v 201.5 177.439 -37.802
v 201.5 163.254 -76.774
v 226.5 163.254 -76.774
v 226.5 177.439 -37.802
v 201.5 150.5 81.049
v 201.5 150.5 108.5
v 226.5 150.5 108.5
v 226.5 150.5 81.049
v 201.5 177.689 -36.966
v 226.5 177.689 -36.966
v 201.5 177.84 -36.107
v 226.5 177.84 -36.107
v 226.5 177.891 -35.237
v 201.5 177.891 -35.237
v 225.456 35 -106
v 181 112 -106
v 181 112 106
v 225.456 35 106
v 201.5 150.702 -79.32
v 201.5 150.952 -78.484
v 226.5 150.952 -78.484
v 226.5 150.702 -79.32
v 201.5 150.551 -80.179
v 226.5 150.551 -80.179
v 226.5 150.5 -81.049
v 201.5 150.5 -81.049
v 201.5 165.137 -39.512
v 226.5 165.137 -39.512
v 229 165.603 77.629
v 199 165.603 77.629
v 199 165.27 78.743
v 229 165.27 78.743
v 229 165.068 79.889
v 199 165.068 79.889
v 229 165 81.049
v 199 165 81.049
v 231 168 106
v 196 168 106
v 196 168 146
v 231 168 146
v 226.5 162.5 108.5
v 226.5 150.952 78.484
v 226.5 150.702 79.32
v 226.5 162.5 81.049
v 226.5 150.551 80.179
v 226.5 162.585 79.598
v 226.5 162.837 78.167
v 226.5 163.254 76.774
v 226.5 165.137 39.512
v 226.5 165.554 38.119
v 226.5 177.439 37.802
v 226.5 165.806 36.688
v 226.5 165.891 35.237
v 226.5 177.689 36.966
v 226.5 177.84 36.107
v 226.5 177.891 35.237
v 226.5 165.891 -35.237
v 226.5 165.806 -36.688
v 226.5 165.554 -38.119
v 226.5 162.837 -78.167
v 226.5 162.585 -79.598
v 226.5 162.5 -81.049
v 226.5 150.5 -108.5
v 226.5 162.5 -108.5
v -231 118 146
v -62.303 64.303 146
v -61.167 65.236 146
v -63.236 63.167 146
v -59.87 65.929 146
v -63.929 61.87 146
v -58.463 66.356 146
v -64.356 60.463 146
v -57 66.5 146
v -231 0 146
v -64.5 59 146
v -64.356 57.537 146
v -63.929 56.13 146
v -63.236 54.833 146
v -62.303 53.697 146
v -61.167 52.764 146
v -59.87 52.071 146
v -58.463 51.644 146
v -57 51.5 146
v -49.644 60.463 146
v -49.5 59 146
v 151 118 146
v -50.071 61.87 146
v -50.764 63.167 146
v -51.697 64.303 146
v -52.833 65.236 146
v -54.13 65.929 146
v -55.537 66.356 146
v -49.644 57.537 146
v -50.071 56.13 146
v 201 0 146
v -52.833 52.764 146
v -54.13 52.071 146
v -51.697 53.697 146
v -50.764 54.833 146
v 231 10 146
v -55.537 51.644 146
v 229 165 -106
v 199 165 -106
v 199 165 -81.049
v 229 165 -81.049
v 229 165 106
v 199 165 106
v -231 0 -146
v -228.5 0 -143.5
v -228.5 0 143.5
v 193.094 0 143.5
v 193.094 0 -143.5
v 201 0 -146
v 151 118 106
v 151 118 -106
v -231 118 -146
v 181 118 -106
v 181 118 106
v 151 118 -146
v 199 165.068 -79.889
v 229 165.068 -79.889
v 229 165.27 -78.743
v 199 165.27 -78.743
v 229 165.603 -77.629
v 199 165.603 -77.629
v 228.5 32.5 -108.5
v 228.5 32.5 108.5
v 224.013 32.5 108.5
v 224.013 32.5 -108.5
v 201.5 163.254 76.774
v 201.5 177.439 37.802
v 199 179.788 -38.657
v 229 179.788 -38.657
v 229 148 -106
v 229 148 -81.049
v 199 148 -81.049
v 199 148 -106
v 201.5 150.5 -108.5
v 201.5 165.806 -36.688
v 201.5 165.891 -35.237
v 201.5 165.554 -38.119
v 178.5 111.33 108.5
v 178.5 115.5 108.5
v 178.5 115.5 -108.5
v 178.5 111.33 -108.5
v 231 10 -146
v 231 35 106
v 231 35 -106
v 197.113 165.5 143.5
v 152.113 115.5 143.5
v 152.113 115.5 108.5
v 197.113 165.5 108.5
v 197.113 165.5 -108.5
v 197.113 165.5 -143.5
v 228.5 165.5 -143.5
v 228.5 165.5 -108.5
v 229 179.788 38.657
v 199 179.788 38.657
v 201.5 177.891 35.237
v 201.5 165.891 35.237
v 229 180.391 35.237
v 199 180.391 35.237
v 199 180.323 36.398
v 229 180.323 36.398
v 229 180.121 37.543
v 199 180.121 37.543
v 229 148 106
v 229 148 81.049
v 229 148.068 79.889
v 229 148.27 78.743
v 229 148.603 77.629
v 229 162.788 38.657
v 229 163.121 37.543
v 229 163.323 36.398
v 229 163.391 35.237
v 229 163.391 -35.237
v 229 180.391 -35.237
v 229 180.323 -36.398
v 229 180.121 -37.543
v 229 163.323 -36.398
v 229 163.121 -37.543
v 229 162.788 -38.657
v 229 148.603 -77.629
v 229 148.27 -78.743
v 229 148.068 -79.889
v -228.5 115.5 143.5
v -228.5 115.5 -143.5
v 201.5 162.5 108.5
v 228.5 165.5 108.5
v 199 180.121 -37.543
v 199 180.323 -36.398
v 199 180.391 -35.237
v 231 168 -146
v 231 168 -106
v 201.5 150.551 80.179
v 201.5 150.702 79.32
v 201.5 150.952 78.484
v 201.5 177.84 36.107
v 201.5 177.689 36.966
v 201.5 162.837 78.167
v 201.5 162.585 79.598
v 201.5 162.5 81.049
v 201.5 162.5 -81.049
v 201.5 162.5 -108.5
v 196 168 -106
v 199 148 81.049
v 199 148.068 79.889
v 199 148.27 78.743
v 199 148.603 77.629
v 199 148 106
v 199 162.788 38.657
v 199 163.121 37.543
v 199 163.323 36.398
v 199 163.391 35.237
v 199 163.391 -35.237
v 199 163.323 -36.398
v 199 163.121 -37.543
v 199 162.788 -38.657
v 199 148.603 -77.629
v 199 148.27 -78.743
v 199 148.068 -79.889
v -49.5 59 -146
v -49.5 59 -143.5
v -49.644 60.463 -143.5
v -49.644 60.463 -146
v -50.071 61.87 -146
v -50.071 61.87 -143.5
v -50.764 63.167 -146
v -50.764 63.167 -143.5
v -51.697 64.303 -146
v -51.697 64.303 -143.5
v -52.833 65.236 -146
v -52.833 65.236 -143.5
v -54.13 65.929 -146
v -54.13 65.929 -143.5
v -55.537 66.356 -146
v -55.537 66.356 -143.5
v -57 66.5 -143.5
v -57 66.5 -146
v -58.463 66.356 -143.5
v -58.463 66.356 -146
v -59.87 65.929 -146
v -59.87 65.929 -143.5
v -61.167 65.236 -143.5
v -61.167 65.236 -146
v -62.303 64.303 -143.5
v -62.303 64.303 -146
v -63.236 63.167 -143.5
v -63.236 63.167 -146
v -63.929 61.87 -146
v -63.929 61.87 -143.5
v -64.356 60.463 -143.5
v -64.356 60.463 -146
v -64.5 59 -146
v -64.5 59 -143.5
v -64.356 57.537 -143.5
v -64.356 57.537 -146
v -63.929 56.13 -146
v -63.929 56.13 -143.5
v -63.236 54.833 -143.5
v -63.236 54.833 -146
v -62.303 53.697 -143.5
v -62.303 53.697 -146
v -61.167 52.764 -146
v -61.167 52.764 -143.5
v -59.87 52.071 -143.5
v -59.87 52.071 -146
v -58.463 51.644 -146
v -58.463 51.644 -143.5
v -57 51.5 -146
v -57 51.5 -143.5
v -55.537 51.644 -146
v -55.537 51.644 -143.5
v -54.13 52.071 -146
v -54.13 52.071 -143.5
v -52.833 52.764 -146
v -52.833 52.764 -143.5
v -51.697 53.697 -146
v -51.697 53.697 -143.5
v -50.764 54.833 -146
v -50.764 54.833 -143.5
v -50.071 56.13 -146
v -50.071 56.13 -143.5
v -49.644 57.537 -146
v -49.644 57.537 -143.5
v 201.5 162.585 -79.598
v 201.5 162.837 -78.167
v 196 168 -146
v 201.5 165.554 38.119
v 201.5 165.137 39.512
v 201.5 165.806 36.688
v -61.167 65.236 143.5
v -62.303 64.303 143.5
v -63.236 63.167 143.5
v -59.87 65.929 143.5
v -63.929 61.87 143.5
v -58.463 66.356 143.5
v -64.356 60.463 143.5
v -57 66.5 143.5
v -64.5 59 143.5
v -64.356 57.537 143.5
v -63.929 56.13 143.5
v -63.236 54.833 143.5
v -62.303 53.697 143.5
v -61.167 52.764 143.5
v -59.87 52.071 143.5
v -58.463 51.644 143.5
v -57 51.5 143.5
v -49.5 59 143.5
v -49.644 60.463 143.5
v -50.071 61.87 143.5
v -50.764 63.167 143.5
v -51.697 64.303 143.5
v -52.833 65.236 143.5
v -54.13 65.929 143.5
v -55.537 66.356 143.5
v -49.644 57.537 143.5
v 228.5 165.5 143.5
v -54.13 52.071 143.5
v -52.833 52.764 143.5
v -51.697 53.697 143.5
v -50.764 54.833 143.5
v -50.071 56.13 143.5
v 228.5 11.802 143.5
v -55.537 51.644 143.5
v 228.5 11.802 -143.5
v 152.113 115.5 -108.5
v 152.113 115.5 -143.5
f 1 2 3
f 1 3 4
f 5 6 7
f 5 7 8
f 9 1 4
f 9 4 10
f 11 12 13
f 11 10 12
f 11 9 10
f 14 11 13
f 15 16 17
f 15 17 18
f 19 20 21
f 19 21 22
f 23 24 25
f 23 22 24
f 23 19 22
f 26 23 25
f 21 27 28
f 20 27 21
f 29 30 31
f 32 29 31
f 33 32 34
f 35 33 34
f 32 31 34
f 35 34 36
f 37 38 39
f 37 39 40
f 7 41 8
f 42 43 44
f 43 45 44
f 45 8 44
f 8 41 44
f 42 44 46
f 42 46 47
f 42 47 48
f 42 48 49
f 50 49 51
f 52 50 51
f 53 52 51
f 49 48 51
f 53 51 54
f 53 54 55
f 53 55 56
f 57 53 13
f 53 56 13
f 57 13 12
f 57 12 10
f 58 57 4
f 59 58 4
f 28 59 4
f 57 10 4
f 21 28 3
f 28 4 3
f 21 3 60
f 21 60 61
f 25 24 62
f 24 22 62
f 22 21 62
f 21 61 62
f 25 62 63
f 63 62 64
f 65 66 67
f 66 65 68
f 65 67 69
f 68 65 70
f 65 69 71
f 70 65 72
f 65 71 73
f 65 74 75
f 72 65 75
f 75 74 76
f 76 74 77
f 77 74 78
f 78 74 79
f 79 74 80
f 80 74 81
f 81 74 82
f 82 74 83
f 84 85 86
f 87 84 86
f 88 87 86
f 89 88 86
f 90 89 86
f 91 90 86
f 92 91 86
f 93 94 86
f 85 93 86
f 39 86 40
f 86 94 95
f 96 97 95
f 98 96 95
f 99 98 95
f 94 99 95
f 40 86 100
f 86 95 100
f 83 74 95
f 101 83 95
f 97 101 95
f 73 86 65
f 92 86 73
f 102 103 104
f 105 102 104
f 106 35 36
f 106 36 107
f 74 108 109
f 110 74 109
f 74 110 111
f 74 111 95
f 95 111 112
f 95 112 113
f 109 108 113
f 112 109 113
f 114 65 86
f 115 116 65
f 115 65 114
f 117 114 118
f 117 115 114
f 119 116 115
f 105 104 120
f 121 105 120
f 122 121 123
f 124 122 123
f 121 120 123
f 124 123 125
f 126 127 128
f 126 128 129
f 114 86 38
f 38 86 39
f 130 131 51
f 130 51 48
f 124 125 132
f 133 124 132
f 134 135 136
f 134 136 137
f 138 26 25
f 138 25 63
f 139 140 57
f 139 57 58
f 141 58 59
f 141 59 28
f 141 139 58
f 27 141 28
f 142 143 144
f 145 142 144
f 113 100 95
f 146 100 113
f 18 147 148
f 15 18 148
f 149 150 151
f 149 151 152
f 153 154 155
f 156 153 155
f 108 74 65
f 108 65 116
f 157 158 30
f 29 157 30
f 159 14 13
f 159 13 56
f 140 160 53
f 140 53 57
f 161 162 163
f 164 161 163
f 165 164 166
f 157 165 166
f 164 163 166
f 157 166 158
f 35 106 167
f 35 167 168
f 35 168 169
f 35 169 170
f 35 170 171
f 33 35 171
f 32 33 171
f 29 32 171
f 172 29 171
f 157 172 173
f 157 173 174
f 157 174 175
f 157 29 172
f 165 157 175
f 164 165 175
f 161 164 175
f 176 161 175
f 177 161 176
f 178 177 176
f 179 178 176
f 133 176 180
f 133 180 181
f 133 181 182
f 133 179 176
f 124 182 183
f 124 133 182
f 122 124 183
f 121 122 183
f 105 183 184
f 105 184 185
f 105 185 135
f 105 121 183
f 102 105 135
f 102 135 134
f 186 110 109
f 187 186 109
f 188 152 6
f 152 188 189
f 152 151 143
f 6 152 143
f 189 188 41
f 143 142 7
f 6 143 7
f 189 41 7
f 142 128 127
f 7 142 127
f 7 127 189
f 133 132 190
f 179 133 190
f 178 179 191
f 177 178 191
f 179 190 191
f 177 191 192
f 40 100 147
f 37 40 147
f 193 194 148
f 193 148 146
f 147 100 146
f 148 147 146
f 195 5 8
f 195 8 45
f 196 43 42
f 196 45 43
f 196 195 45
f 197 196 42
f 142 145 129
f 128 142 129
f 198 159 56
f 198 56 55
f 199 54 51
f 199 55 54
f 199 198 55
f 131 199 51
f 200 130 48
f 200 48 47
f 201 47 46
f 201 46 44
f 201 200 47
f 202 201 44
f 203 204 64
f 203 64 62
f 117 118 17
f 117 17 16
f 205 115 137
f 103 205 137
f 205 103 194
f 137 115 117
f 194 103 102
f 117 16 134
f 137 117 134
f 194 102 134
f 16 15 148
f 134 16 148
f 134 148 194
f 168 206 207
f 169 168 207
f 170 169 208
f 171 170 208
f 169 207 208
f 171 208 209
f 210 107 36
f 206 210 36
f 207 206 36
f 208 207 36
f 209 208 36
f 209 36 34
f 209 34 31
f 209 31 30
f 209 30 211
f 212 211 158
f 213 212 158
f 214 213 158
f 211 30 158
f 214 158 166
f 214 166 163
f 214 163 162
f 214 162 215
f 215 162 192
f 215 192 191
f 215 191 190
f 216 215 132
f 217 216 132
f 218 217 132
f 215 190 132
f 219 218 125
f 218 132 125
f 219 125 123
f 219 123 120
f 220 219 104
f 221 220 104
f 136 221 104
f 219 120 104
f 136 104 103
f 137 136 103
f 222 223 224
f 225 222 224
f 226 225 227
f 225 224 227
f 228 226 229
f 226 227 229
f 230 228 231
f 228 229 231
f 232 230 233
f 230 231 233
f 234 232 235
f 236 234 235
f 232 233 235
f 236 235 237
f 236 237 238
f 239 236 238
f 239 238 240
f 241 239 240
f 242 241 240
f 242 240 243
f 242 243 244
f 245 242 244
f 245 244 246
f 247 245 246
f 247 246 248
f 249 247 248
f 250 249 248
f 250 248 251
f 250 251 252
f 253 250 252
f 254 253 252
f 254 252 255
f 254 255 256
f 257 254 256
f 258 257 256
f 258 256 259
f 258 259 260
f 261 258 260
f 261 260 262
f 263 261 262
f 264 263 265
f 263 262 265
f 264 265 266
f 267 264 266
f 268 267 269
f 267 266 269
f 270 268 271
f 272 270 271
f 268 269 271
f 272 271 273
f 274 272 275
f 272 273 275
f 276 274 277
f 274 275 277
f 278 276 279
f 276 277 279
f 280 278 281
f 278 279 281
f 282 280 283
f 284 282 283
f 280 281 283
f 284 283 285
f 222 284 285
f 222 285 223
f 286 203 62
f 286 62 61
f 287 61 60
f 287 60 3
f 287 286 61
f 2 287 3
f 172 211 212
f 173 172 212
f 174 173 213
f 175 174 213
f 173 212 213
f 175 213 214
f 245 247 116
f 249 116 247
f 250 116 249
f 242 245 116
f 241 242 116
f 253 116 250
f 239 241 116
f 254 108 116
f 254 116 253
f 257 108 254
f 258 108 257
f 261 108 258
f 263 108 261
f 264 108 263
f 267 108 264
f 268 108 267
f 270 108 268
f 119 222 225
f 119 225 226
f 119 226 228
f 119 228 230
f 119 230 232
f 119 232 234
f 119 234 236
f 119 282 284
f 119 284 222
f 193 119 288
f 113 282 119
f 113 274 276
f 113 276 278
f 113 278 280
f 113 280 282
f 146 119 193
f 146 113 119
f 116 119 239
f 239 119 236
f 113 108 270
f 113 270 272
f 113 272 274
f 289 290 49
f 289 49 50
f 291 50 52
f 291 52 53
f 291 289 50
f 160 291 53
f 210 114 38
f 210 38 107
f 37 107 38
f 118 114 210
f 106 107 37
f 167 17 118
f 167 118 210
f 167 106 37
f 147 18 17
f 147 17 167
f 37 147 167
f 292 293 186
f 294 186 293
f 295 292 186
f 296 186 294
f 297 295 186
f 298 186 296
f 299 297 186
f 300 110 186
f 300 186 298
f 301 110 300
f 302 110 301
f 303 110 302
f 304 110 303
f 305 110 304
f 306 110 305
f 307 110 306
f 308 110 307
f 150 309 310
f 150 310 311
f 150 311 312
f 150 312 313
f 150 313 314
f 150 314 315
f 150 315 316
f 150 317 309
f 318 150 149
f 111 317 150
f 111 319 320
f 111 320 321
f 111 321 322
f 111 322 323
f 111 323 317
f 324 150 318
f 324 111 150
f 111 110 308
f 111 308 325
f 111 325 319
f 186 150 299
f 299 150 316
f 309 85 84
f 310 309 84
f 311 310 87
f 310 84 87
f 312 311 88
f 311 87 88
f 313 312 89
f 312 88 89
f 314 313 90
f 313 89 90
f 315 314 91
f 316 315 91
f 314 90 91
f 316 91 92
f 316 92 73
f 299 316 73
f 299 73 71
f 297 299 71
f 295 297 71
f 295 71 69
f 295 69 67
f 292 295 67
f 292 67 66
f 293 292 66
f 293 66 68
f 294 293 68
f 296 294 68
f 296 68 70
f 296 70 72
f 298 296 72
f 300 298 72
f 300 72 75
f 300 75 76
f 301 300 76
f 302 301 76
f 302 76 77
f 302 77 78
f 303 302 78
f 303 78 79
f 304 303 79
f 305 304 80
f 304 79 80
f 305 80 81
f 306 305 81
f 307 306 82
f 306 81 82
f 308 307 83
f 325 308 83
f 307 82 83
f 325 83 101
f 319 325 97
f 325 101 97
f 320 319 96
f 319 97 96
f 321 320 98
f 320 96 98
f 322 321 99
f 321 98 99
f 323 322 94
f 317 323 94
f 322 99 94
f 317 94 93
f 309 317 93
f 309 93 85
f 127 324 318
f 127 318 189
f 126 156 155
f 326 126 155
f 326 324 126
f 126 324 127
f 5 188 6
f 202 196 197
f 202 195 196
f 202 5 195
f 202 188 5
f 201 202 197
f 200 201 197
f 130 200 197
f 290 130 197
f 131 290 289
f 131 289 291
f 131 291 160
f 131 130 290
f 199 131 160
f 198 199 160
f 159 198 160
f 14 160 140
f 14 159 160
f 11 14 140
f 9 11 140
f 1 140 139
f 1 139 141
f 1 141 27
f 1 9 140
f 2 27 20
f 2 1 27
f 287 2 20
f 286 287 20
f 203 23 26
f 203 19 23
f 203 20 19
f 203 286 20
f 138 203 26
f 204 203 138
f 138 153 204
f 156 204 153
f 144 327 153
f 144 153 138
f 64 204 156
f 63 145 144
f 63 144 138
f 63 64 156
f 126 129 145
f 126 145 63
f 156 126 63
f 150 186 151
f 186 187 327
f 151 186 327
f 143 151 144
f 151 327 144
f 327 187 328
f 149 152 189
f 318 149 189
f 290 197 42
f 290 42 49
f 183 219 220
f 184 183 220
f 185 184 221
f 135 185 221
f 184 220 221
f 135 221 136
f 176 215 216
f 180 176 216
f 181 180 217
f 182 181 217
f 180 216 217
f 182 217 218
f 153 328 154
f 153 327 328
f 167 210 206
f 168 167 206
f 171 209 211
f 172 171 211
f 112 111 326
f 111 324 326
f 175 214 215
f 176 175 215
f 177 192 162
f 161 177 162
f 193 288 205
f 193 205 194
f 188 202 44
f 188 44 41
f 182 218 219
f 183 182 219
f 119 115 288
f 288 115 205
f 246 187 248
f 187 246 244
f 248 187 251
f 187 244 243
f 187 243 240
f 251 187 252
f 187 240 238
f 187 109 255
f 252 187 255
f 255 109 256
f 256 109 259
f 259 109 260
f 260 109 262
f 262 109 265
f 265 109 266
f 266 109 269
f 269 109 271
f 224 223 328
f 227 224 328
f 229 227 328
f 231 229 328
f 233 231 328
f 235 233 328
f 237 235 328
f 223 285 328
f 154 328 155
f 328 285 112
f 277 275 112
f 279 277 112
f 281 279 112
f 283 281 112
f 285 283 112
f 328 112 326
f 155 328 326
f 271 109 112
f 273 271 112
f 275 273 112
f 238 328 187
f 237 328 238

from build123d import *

# Parameters (mm, degrees)
SKETCH1_W           = 462
SKETCH1_H           = 292
BOSS_EXTRUDE1_DEPTH = 118
CHAMFER1_SIZE       = 30
CHAMFER1_SIZE2      = 10
SKETCH2_W           = 80
SKETCH2_H           = 40
BOSS_EXTRUDE2_DEPTH = 50
CUT_EXTRUDE1_DEPTH  = 293
SKETCH5_W           = 212
SKETCH5_H           = 83
CUT_EXTRUDE3_DEPTH  = 50
BOSS_EXTRUDE3_DEPTH = 30
BOSS_EXTRUDE5_REACH = 254
SHELL1_T            = -2.5
SKETCH9_R           = 7.5
CUT_EXTRUDE4_DEPTH  = 293


with BuildPart() as part:
    # Sketch1 → Boss-Extrude1 (new body)
    with BuildSketch(Plane(origin=(0, 0, 0), x_dir=(1, 0, 0), z_dir=(0, 1, 0))):
        Rectangle(SKETCH1_W, SKETCH1_H)
    extrude(amount=BOSS_EXTRUDE1_DEPTH)

    # Chamfer1
    chamfer1_edges = [part.edges().sort_by_distance(p)[0] for p in [
        (231, 0, 0),
    ]]
    chamfer1_side = [part.faces().sort_by_distance(p)[0] for p in [
        (0, 0, 0),
    ]]
    chamfer(chamfer1_edges, length=CHAMFER1_SIZE, length2=CHAMFER1_SIZE2, reference=chamfer1_side[0])

    # Sketch2 → Boss-Extrude2 (add)
    with BuildSketch(Plane(origin=(0, 118, 0), x_dir=(1, 0, 0), z_dir=(0, 1, 0))):
        with Locations((191, 126)):
            Rectangle(SKETCH2_W, SKETCH2_H)
        with Locations((191, -126)):
            Rectangle(SKETCH2_W, SKETCH2_H)
    extrude(amount=BOSS_EXTRUDE2_DEPTH)

    # Sketch3 → Cut-Extrude1 (cut, through all)
    with BuildSketch(Plane.XY.offset(146)):
        Polygon((151, 118), (196, 168), (151, 168), align=None)
    extrude(amount=-CUT_EXTRUDE1_DEPTH, mode=Mode.SUBTRACT)

    # Sketch5 → Cut-Extrude3 (cut)
    with BuildSketch(Plane(origin=(231, 0, 0), x_dir=(0, 0, -1), z_dir=(1, 0, 0))):
        with Locations((0, 76.5)):
            Rectangle(SKETCH5_W, SKETCH5_H)
    extrude(amount=-CUT_EXTRUDE3_DEPTH, mode=Mode.SUBTRACT)

    # Sketch6 → Boss-Extrude3 (add)
    with BuildSketch(Plane(origin=(199, 0, 0), x_dir=(0, 0, -1), z_dir=(1, 0, 0))):
        with BuildLine():
            Line((106, 165), (81.049437742, 165))
            ThreePointArc((81.049437742, 165), (79.312955966, 165.15192247), (77.629236309, 165.603073792))
            Line((77.629236309, 165.603073792), (38.656931626, 179.787832658))
            ThreePointArc((38.656931626, 179.787832658), (36.97321197, 180.23898398), (35.236730193, 180.39090645))
            Line((35.236730193, 180.39090645), (-35.236730193, 180.39090645))
            ThreePointArc((-35.236730193, 180.39090645), (-36.97321197, 180.23898398), (-38.656931626, 179.787832658))
            Line((-38.656931626, 179.787832658), (-77.629236309, 165.603073792))
            ThreePointArc((-77.629236309, 165.603073792), (-79.312955966, 165.15192247), (-81.049437742, 165))
            Line((-81.049437742, 165), (-106, 165))
            Line((-106, 165), (-106, 148))
            Line((-106, 148), (-81.049437742, 148))
            ThreePointArc((-81.049437742, 148), (-79.312955966, 148.15192247), (-77.629236309, 148.603073792))
            Line((-77.629236309, 148.603073792), (-38.656931626, 162.787832658))
            ThreePointArc((-38.656931626, 162.787832658), (-36.97321197, 163.23898398), (-35.236730193, 163.39090645))
            Line((-35.236730193, 163.39090645), (35.236730193, 163.39090645))
            ThreePointArc((35.236730193, 163.39090645), (36.97321197, 163.23898398), (38.656931626, 162.787832658))
            Line((38.656931626, 162.787832658), (77.629236309, 148.603073792))
            ThreePointArc((77.629236309, 148.603073792), (79.312955966, 148.15192247), (81.049437742, 148))
            Line((81.049437742, 148), (106, 148))
            Line((106, 148), (106, 165))
        make_face()
    extrude(amount=BOSS_EXTRUDE3_DEPTH)

    # Sketch8 → Boss-Extrude5 (add, up to next)
    with BuildSketch(Plane.XY.offset(-106), mode=Mode.PRIVATE) as boss_extrude5_sk1:
        Polygon((181, 112), (225.455970728, 35), (181, 35), align=None)
    boss_extrude5_tool1 = extrude(boss_extrude5_sk1.sketch, amount=BOSS_EXTRUDE5_REACH, mode=Mode.PRIVATE) - part.part
    add(boss_extrude5_tool1.solids().sort_by_distance((195.818657, 60.666667, -106))[0])

    # Shell1
    shell1_openings = [part.faces().sort_by_distance(p)[0] for p in [
        (-15, 0, 0),
    ]]
    offset(amount=SHELL1_T, openings=shell1_openings, kind=Kind.INTERSECTION)

    # Sketch9 → Cut-Extrude4 (cut, through all)
    with BuildSketch(Plane.XY.offset(146)):
        with Locations((-57, 59)):
            Circle(SKETCH9_R)
    extrude(amount=-CUT_EXTRUDE4_DEPTH, mode=Mode.SUBTRACT)


solid = part.part
